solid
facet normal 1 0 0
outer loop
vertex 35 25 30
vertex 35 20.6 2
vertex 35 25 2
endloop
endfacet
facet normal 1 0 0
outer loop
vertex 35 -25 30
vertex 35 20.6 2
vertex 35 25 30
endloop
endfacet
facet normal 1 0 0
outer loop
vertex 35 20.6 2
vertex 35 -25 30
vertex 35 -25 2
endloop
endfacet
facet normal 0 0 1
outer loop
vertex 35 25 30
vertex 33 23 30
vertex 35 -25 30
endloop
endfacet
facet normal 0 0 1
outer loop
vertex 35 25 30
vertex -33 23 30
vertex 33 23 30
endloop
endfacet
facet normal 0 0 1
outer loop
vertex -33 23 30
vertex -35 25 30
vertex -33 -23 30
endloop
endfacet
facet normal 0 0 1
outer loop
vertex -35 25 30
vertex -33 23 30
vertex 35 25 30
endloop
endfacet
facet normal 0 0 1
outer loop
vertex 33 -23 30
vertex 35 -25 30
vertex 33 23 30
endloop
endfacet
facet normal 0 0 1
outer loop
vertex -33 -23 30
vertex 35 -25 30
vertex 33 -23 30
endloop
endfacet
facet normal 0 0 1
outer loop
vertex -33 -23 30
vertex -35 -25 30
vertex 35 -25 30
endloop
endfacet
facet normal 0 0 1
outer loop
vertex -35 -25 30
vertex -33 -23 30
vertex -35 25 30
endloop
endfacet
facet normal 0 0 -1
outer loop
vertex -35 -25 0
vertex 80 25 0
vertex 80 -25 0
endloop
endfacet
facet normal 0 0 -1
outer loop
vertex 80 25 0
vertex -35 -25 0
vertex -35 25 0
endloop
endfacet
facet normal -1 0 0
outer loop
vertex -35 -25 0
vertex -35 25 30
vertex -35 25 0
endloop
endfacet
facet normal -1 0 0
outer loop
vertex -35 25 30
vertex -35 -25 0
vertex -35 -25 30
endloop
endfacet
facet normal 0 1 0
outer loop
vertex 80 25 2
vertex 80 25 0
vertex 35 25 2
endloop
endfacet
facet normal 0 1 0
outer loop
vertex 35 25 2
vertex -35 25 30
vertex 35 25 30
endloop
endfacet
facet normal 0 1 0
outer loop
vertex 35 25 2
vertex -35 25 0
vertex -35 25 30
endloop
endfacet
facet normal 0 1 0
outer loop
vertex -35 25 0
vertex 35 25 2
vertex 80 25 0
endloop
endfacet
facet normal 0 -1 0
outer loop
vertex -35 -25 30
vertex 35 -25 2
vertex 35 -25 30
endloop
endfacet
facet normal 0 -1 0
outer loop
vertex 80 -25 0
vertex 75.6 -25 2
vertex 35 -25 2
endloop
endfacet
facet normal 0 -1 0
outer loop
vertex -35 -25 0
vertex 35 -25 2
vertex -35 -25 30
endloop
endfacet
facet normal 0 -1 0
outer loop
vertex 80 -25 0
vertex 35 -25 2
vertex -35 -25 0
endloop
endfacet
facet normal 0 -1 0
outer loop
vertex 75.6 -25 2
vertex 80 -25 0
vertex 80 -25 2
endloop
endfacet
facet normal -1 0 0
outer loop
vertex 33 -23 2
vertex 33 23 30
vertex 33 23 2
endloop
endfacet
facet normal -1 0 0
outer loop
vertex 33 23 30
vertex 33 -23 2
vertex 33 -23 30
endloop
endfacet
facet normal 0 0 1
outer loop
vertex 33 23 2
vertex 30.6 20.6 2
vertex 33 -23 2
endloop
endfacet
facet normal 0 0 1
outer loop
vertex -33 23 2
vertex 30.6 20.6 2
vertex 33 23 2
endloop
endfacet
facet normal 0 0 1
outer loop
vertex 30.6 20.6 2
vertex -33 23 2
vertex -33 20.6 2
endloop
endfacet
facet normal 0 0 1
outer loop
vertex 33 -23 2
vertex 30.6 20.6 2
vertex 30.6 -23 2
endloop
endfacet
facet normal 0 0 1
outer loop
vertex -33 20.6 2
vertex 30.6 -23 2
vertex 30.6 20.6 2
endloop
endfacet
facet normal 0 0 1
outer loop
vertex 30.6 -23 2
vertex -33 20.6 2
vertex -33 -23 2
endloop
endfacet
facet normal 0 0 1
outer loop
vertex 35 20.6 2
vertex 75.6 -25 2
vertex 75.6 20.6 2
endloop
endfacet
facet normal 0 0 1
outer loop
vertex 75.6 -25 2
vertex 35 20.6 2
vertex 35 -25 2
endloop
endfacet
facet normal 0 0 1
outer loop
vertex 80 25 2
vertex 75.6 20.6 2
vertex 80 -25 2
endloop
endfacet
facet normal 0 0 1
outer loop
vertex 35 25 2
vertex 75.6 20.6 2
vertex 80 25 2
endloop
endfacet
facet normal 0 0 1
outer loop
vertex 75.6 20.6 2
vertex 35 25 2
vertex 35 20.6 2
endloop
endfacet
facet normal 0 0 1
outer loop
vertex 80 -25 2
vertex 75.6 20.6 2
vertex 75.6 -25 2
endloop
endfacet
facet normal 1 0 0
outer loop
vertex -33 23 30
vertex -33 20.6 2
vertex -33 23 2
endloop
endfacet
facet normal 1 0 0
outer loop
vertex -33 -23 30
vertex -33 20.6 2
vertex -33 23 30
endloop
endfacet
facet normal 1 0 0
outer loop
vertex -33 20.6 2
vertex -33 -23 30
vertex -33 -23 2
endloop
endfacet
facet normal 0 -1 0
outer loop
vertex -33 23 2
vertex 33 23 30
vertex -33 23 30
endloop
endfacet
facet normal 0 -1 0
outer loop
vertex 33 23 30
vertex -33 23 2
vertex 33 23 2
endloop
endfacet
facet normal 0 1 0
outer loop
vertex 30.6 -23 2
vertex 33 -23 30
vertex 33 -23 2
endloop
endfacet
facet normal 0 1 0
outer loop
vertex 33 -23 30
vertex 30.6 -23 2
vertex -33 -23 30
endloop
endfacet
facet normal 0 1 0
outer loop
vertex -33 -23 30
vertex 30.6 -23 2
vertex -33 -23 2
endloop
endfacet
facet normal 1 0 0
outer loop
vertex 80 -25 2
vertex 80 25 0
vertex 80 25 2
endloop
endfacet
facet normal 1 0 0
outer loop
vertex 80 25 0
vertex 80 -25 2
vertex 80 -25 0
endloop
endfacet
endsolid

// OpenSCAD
// Two-part enclosure for electronics board.
// Part 1: Box (left) - 70x50x30mm outer, 2mm walls/floor, open top.
// Part 2: Lid (right) - 70x50x2mm plate with 4mm tall lip (1.5mm wall), 
// placed on +X side with 10mm gap.

// Dimensions
box_outer_x = 70;
box_outer_y = 50;
box_outer_z = 30;
wall_thick  = 2;
floor_thick = 2;

// Lid dimensions
lid_plate_z = 2;
lip_height  = 4;
lip_wall    = 1.5;
lip_outer_x = 65.6;
lip_outer_y = 45.6;

// Gap between parts
gap = 10;

// Clearances for the lip to slide into the box
// Box inner width = 50 - 2*2 = 46
// Lip outer width = 45.6
// Clearance = (46 - 45.6) / 2 = 0.2 mm
clearance = 0.2;

$fn = 64;

// --- Part 1: The Box ---
// Constructed by taking a solid block and subtracting the empty space.
// The empty space is the inner volume plus the top opening.

difference() {
    // Main solid block
    translate([-box_outer_x/2, -box_outer_y/2, 0]) 
        cube([box_outer_x, box_outer_y, box_outer_z]);
    
    // Cut out the interior
    // Inner dimensions:
    // X: 70 - 2*2 = 66
    // Y: 50 - 2*2 = 46
    // Z: 30 - 2 (floor) = 28
    translate([-box_outer_x/2 + wall_thick, -box_outer_y/2 + wall_thick, floor_thick])
        cube([box_outer_x - 2*wall_thick, box_outer_y - 2*wall_thick, box_outer_z - floor_thick]);
}

// --- Part 2: The Lid ---
// Constructed as a plate with a raised lip.
// The lip is a wall of thickness 1.5mm and height 4mm.
// Outer size of lip: 65.6 x 45.6.
// Inner size of lip (hole): 65.6 - 2*1.5 = 62.6 x 45.6 - 2*1.5 = 42.6.

difference() {
    // Base plate
    translate([-box_outer_x/2, -box_outer_y/2, 0])
        cube([box_outer_x, box_outer_y, lid_plate_z]);
    
    // The Lip (raised part)
    // We create a solid block for the lip and cut the hole through it.
    // Lip outer size: 65.6 x 45.6
    // Lip height: 4mm
    // Lip wall: 1.5mm
    
    // Solid block for the lip
    translate([-box_outer_x/2, -box_outer_y/2, lid_plate_z])
        cube([lip_outer_x, lip_outer_y, lip_height]);
    
    // Hole in the lip
    // Inner dimensions:
    // X: 65.6 - 2*1.5 = 62.6
    // Y: 45.6 - 2*1.5 = 42.6
    translate([-box_outer_x/2, -box_outer_y/2, lid_plate_z])
        cube([lip_outer_x - 2*lip_wall, lip_outer_y - 2*lip_wall, lip_height]);
}

// --- Assembly ---
// Place the box at the origin.
// Place the lid on the +X side with a 10mm gap.
// Box width is 70, so the right face is at X = 35.
// Lid left face should be at X = 35 + 10 = 45.
// Lid center X = 45 + 70/2 = 80.

translate([0, 0, 0])
    part1_box();

translate([gap + box_outer_x/2, 0, 0])
    part2_lid();

// Helper modules to keep the code clean and avoid re-defining geometry twice
module part1_box() {
    difference() {
        translate([-box_outer_x/2, -box_outer_y/2, 0]) 
            cube([box_outer_x, box_outer_y, box_outer_z]);
        
        translate([-box_outer_x/2 + wall_thick, -box_outer_y/2 + wall_thick, floor_thick])
            cube([box_outer_x - 2*wall_thick, box_outer_y - 2*wall_thick, box_outer_z - floor_thick]);
    }
}

module part2_lid() {
    difference() {
        translate([-box_outer_x/2, -box_outer_y/2, 0])
            cube([box_outer_x, box_outer_y, lid_plate_z]);
        
        translate([-box_outer_x/2, -box_outer_y/2, lid_plate_z])
            cube([lip_outer_x, lip_outer_y, lip_height]);
        
        translate([-box_outer_x/2, -box_outer_y/2, lid_plate_z])
            cube([lip_outer_x - 2*lip_wall, lip_outer_y - 2*lip_wall, lip_height]);
    }
}
